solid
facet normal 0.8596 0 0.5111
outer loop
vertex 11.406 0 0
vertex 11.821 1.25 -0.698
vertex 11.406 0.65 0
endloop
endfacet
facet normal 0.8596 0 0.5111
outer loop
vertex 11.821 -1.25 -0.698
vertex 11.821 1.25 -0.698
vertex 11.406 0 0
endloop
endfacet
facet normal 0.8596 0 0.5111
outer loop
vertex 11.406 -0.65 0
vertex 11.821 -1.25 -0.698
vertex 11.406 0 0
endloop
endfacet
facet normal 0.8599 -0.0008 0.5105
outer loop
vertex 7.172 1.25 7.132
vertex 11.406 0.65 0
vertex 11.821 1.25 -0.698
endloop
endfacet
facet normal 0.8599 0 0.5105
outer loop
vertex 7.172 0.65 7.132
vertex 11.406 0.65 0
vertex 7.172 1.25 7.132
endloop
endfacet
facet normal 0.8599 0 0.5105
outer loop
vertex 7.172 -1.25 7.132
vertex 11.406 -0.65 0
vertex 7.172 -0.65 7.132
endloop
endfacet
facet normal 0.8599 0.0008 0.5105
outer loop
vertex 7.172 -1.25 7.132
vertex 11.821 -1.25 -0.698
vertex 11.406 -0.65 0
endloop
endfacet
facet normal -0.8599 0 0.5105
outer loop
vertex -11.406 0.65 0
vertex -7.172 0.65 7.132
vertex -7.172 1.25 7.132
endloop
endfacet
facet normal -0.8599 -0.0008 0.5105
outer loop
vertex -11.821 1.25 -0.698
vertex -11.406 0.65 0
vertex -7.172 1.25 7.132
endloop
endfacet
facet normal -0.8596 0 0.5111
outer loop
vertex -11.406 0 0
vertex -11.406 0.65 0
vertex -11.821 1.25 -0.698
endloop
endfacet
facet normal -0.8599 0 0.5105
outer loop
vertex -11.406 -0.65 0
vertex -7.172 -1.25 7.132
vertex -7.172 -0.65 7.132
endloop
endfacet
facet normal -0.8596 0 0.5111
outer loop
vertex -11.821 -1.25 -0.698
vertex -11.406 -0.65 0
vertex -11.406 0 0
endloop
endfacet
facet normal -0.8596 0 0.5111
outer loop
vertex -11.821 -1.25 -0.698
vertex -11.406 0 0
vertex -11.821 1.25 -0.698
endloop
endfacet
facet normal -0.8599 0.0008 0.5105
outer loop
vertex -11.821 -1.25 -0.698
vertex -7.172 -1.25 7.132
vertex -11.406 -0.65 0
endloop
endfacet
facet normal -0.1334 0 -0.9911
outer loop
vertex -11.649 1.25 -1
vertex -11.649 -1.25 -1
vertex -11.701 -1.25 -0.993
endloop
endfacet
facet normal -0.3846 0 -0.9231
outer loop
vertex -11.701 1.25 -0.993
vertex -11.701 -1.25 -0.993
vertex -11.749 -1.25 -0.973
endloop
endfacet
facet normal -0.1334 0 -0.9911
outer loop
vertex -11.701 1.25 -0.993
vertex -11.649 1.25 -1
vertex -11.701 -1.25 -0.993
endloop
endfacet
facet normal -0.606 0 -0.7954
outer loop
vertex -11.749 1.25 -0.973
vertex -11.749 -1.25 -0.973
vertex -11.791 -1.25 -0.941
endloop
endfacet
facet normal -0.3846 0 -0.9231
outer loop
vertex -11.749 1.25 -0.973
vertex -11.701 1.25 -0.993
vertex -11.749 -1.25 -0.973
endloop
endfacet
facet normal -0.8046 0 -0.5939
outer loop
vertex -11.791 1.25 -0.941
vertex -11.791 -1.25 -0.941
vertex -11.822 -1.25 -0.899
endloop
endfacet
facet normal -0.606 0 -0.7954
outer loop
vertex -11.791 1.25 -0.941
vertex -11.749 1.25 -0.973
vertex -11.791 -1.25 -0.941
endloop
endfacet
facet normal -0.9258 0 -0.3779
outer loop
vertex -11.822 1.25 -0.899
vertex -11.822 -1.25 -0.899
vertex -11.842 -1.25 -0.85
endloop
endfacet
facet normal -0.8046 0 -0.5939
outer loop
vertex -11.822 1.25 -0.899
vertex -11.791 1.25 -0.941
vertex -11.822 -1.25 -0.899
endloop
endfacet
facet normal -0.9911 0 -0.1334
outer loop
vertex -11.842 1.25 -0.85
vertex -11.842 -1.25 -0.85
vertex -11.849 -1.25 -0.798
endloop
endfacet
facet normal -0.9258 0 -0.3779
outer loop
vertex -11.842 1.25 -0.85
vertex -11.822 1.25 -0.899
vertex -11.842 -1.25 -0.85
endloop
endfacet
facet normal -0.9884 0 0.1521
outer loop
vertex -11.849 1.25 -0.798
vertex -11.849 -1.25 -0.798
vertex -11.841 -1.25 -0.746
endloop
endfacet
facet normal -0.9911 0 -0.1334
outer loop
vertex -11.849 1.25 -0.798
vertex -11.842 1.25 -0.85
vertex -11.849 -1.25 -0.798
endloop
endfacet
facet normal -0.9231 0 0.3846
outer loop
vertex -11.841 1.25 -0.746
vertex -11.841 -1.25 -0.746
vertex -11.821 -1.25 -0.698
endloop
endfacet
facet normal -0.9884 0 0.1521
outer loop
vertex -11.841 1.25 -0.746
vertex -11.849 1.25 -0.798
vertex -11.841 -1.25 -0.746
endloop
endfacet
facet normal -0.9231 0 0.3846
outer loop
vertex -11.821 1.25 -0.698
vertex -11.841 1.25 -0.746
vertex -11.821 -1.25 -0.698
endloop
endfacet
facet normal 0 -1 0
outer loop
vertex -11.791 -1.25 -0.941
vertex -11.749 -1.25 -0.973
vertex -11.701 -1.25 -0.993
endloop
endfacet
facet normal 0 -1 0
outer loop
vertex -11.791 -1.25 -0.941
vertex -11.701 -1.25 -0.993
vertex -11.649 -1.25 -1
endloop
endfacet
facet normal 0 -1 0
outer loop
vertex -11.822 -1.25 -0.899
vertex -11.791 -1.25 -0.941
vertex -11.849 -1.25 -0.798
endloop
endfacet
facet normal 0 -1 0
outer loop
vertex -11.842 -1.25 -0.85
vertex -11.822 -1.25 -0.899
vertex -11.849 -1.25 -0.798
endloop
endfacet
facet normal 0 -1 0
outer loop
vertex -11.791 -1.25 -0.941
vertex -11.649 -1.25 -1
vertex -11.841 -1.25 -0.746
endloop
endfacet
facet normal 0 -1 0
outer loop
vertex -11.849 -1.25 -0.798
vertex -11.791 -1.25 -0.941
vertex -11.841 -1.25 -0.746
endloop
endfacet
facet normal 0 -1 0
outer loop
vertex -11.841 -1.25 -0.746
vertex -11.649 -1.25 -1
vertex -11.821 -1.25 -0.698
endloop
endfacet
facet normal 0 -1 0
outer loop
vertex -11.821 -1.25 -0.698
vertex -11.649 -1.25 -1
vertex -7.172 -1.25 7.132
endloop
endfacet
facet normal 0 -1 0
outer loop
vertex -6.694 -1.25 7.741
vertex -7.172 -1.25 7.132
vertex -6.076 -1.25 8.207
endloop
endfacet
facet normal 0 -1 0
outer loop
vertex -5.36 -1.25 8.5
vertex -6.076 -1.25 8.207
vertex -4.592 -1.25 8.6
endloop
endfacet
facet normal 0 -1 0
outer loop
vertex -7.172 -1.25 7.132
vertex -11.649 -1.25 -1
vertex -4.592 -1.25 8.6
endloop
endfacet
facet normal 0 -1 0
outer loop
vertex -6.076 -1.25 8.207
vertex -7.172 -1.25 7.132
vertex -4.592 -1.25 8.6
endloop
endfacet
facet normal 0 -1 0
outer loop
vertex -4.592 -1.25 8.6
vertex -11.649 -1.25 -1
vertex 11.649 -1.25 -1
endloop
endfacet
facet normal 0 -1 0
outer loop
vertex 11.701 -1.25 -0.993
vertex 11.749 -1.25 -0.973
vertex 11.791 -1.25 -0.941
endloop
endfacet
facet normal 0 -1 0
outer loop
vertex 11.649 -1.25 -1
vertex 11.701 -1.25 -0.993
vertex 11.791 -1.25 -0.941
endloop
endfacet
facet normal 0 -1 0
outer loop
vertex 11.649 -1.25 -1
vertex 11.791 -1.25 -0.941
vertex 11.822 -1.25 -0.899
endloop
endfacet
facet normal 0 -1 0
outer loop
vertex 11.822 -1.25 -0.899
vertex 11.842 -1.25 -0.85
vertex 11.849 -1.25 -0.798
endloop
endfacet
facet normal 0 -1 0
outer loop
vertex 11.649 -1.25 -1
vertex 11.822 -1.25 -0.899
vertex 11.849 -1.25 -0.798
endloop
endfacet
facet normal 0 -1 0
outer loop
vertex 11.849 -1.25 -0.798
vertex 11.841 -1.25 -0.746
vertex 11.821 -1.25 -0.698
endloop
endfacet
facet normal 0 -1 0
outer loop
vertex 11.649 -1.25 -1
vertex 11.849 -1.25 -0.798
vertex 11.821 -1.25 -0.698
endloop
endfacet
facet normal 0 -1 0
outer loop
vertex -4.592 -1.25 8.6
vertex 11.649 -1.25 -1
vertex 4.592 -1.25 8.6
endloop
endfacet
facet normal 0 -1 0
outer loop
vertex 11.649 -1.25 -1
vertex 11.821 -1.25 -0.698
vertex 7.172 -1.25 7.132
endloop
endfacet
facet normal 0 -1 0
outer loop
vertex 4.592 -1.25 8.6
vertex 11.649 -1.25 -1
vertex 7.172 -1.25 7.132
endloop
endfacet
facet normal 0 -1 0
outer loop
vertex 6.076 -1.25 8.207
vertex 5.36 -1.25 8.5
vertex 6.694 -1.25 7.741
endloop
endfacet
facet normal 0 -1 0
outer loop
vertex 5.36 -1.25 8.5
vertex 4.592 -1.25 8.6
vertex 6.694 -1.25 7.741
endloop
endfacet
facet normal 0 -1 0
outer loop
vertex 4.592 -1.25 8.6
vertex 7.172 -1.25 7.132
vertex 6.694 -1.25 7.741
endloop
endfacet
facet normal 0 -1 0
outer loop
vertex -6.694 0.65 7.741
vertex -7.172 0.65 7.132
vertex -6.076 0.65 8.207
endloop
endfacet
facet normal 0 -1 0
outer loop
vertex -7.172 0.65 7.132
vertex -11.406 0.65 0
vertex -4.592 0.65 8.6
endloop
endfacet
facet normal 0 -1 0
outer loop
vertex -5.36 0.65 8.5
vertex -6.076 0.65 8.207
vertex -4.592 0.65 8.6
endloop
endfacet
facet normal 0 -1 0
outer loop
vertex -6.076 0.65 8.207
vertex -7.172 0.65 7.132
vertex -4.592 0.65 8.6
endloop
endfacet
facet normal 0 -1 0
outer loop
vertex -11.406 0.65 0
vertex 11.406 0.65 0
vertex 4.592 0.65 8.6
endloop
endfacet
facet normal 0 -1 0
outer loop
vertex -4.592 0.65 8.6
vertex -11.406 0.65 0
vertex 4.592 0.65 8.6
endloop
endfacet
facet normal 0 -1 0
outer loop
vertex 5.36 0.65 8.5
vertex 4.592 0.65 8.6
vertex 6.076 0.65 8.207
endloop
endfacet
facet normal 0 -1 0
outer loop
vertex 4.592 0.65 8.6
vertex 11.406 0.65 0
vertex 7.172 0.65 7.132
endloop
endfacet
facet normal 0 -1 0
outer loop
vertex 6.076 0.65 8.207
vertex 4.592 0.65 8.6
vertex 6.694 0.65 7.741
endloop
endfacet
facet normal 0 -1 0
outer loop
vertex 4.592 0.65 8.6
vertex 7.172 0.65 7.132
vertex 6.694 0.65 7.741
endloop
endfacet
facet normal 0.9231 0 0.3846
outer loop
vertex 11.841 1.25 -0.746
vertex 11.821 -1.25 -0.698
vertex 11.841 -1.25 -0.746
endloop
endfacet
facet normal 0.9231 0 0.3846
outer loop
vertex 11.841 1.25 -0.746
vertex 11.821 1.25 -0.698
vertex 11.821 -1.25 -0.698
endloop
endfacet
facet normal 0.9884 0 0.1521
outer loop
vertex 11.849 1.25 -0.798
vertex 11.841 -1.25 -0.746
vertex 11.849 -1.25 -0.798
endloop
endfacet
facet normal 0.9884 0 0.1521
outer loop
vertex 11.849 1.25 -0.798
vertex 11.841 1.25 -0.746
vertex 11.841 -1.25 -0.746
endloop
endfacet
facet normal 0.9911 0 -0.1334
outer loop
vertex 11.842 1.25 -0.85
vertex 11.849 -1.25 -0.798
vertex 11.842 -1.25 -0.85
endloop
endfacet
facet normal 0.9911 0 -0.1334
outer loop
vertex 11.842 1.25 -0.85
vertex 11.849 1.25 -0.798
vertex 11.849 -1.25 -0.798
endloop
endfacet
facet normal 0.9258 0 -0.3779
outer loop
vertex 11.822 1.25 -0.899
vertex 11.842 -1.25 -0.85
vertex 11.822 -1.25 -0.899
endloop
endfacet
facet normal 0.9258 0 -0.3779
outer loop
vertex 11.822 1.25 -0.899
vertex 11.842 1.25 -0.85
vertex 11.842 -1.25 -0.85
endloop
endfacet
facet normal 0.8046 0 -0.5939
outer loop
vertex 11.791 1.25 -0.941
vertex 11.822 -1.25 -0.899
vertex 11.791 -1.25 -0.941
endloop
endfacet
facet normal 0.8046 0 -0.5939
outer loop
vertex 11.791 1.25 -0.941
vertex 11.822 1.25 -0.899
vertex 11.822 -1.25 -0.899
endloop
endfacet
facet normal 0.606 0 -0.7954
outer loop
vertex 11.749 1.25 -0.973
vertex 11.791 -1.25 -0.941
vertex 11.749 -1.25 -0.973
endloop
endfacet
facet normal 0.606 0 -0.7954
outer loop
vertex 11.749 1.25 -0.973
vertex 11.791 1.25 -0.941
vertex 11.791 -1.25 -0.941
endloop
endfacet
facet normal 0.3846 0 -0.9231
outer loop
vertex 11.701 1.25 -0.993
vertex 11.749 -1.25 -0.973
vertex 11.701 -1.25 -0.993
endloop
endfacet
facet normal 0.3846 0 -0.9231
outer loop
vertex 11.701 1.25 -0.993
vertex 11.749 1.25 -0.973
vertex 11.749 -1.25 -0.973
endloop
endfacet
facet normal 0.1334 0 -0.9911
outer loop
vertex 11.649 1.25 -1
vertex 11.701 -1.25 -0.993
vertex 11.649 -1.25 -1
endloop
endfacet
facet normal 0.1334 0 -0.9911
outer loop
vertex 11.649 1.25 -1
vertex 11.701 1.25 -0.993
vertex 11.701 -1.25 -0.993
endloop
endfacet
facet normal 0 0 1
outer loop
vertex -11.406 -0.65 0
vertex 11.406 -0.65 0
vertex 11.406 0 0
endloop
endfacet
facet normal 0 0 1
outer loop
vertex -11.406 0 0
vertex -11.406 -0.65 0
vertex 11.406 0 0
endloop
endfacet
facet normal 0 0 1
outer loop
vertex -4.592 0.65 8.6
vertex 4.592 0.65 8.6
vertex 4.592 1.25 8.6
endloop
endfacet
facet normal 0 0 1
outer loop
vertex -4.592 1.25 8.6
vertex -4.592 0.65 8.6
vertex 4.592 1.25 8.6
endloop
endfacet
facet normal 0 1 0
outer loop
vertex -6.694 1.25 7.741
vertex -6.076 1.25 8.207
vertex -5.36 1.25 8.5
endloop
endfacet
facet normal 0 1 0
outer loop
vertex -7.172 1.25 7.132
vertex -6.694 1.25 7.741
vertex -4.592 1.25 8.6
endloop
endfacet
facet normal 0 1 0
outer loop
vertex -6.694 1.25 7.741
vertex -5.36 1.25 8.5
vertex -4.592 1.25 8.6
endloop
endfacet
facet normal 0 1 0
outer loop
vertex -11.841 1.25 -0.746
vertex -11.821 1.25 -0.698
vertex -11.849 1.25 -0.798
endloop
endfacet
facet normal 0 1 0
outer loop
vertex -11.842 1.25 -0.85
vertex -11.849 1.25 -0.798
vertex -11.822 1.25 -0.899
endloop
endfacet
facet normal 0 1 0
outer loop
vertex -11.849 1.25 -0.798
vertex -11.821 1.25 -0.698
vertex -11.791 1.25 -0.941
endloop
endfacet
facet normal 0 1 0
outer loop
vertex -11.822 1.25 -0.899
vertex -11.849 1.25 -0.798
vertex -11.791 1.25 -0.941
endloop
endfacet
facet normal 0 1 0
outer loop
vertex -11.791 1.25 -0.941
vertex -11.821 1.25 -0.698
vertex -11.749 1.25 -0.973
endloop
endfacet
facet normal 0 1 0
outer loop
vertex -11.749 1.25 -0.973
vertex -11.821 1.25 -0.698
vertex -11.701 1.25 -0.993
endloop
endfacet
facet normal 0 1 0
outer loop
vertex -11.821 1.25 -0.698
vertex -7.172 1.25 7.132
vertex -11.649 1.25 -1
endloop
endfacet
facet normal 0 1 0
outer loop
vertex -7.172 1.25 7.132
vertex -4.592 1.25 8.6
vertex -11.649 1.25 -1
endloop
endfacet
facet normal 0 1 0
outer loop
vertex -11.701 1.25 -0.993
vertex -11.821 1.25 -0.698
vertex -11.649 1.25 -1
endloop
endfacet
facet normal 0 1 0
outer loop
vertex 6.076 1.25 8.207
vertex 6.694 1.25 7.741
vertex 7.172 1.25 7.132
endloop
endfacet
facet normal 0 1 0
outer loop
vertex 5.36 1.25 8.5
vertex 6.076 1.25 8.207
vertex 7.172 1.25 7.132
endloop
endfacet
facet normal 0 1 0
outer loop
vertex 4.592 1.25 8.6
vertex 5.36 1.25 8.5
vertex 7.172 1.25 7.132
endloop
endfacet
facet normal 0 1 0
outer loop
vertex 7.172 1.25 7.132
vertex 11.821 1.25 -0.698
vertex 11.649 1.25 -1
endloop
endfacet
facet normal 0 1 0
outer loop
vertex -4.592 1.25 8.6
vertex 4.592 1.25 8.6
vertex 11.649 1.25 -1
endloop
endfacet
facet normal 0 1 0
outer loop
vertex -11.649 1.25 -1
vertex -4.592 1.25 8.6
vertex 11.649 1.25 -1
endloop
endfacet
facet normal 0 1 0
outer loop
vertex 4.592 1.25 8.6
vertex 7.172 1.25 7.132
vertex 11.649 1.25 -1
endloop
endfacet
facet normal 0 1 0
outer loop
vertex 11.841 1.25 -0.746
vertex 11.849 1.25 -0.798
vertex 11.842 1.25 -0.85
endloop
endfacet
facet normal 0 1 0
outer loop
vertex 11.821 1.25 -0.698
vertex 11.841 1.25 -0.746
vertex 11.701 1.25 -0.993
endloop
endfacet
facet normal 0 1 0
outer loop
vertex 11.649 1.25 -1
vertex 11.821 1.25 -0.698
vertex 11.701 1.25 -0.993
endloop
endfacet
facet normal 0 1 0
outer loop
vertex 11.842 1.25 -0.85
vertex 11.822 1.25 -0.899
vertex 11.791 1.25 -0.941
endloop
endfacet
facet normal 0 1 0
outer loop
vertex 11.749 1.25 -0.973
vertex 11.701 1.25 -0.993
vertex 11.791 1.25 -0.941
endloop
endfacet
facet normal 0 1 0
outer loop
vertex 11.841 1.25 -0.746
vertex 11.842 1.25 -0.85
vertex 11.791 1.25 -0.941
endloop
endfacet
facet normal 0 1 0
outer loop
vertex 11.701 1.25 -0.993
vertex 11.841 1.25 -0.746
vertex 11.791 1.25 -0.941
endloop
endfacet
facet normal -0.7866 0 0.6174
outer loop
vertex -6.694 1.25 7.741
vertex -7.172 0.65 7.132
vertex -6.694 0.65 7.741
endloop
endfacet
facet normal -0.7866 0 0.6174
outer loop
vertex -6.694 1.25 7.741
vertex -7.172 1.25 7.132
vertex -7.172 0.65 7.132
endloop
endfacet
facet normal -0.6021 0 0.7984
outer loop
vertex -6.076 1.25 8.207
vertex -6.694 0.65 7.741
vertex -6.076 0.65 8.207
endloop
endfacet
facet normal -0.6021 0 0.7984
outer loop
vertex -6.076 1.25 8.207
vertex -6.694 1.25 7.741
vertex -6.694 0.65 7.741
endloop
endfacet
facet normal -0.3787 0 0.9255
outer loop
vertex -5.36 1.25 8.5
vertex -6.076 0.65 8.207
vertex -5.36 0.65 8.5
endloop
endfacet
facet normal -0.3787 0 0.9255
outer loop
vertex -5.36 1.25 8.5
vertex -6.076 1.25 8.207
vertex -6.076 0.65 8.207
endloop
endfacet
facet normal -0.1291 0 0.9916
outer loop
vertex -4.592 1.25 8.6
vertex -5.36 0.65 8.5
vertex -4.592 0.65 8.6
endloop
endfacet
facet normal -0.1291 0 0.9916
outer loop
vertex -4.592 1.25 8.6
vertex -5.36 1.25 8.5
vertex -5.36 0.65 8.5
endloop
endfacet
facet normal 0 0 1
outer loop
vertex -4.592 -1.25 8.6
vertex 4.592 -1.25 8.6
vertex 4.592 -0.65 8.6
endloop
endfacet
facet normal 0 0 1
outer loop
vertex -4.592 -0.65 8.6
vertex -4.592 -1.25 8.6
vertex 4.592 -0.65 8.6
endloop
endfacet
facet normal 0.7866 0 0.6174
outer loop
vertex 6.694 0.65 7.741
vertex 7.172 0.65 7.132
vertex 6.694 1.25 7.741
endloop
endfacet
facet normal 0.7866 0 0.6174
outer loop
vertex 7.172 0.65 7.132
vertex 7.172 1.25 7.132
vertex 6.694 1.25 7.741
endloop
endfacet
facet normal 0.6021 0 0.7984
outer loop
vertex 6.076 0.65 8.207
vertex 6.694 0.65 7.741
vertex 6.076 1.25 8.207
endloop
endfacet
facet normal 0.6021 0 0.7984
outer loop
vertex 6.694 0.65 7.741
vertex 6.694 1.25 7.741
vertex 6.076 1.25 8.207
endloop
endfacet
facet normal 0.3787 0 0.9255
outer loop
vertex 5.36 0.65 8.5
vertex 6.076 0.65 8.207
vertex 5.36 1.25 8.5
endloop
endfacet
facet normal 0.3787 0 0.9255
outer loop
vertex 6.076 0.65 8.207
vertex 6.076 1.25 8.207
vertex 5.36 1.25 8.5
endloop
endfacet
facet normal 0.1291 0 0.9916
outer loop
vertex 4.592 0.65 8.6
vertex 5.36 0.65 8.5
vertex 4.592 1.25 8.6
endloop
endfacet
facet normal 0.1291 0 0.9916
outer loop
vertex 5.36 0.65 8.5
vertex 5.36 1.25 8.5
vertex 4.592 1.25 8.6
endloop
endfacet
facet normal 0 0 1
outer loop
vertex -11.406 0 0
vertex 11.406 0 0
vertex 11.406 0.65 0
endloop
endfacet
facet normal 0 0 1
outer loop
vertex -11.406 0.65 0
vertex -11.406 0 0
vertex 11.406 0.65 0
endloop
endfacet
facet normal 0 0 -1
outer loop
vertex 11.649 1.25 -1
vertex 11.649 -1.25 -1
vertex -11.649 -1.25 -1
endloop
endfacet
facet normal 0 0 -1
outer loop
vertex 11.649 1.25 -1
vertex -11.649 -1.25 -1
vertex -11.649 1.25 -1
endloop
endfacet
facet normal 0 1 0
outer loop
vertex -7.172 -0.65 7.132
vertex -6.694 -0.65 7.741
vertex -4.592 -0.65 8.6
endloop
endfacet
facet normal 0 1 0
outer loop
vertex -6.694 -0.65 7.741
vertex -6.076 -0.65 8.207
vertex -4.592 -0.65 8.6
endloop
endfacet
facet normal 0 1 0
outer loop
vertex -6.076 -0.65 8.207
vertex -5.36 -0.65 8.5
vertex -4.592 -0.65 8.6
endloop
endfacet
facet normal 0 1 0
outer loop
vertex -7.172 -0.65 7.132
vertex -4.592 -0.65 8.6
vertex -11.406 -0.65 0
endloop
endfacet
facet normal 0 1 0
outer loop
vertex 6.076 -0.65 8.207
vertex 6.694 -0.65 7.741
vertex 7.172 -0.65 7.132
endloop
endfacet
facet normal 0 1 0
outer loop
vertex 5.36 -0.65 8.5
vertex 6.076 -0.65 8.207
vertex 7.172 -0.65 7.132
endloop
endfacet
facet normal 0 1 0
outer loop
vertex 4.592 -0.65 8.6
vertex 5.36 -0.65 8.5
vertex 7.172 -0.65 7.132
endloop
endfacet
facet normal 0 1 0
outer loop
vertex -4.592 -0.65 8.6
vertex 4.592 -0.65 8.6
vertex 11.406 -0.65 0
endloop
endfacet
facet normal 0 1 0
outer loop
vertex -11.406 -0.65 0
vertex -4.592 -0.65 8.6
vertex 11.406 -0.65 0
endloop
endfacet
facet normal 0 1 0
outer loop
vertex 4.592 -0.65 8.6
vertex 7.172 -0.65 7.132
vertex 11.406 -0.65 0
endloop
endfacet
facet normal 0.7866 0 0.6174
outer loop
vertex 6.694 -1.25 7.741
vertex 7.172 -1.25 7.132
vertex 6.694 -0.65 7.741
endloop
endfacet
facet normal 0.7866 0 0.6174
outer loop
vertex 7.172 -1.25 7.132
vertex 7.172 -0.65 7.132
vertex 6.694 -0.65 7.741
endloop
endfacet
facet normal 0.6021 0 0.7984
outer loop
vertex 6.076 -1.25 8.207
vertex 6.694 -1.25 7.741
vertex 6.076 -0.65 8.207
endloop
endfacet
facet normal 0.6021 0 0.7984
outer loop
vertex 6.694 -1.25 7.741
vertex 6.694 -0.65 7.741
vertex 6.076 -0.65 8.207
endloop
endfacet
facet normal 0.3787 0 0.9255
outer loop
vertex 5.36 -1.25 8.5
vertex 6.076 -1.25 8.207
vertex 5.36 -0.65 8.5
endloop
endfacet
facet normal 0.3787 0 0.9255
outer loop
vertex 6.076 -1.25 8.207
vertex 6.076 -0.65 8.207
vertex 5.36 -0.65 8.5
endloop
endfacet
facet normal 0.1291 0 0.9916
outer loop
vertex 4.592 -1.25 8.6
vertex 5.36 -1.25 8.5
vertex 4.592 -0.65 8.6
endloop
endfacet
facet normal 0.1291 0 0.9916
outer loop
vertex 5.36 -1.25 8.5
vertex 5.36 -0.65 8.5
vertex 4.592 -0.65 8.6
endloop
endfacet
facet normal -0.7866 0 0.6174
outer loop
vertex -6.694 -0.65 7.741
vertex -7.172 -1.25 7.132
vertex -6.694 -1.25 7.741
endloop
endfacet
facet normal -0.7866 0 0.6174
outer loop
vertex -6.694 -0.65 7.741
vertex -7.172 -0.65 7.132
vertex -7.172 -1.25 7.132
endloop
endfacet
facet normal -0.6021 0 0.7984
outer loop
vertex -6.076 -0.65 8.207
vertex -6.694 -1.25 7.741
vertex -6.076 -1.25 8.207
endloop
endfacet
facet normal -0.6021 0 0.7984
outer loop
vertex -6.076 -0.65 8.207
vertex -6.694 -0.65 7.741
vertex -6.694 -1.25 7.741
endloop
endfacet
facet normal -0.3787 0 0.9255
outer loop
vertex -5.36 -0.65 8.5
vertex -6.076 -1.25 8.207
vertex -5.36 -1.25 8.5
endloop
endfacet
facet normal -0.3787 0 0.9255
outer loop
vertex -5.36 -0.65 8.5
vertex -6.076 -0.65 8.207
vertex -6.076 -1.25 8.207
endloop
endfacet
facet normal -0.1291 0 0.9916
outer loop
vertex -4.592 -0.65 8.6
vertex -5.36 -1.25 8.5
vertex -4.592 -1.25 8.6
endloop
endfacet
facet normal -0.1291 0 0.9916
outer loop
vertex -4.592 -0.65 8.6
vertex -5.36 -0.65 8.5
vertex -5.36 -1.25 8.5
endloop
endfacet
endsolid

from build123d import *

# Parameters (mm, degrees)
PAD_DEPTH      = 12
PAD_DEPTH_BACK = 12
POCKET_DEPTH   = 2.501
FILLET_R       = 3
FILLET001_R    = 0.2


with BuildPart() as part:
    # Sketch → Pad (new body, two sides)
    with BuildSketch(Plane.YZ) as pad_sk:
        Polygon((0, 0), (0.65, 0), (0.65, 8.6), (1.25, 8.6), (1.25, -1), (0, -1), (-1.25, -1), (-1.25, 8.6), (-0.65, 8.6), (-0.65, -4e-06), align=None)
    extrude(amount=PAD_DEPTH)
    extrude(pad_sk.sketch, amount=-PAD_DEPTH_BACK)

    # Sketch001 (on Face7 of Pad) → Pocket (cut, through all)
    with BuildSketch(Plane(origin=(0, -1.25, 0), x_dir=(0, 0, -1), z_dir=(0, -1, 0))):
        Polygon((1, 12), (-8.6, 6.3), (-8.6, 0), (-8.6, -6.3), (1, -12), (1, -14), (-11, -14), (-11, 0), (-11, 14), (1, 14), align=None)
    extrude(amount=-POCKET_DEPTH, mode=Mode.SUBTRACT)

    # Fillet
    fillet_edges = [part.edges().sort_by_distance(p)[0] for p in [
        (6.3, -0.95, 8.6),
        (6.3, 0.95, 8.6),
        (-6.3, 0.95, 8.6),
        (-6.3, -0.95, 8.6),
    ]]
    fillet(fillet_edges, radius=FILLET_R)

    # Fillet001
    fillet001_edges = [part.edges().sort_by_distance(p)[0] for p in [
        (12, -0.625, -1),
        (12, 0.625, -1),
        (-12, 0.625, -1),
        (-12, -0.625, -1),
    ]]
    fillet(fillet001_edges, radius=FILLET001_R)


solid = part.part
